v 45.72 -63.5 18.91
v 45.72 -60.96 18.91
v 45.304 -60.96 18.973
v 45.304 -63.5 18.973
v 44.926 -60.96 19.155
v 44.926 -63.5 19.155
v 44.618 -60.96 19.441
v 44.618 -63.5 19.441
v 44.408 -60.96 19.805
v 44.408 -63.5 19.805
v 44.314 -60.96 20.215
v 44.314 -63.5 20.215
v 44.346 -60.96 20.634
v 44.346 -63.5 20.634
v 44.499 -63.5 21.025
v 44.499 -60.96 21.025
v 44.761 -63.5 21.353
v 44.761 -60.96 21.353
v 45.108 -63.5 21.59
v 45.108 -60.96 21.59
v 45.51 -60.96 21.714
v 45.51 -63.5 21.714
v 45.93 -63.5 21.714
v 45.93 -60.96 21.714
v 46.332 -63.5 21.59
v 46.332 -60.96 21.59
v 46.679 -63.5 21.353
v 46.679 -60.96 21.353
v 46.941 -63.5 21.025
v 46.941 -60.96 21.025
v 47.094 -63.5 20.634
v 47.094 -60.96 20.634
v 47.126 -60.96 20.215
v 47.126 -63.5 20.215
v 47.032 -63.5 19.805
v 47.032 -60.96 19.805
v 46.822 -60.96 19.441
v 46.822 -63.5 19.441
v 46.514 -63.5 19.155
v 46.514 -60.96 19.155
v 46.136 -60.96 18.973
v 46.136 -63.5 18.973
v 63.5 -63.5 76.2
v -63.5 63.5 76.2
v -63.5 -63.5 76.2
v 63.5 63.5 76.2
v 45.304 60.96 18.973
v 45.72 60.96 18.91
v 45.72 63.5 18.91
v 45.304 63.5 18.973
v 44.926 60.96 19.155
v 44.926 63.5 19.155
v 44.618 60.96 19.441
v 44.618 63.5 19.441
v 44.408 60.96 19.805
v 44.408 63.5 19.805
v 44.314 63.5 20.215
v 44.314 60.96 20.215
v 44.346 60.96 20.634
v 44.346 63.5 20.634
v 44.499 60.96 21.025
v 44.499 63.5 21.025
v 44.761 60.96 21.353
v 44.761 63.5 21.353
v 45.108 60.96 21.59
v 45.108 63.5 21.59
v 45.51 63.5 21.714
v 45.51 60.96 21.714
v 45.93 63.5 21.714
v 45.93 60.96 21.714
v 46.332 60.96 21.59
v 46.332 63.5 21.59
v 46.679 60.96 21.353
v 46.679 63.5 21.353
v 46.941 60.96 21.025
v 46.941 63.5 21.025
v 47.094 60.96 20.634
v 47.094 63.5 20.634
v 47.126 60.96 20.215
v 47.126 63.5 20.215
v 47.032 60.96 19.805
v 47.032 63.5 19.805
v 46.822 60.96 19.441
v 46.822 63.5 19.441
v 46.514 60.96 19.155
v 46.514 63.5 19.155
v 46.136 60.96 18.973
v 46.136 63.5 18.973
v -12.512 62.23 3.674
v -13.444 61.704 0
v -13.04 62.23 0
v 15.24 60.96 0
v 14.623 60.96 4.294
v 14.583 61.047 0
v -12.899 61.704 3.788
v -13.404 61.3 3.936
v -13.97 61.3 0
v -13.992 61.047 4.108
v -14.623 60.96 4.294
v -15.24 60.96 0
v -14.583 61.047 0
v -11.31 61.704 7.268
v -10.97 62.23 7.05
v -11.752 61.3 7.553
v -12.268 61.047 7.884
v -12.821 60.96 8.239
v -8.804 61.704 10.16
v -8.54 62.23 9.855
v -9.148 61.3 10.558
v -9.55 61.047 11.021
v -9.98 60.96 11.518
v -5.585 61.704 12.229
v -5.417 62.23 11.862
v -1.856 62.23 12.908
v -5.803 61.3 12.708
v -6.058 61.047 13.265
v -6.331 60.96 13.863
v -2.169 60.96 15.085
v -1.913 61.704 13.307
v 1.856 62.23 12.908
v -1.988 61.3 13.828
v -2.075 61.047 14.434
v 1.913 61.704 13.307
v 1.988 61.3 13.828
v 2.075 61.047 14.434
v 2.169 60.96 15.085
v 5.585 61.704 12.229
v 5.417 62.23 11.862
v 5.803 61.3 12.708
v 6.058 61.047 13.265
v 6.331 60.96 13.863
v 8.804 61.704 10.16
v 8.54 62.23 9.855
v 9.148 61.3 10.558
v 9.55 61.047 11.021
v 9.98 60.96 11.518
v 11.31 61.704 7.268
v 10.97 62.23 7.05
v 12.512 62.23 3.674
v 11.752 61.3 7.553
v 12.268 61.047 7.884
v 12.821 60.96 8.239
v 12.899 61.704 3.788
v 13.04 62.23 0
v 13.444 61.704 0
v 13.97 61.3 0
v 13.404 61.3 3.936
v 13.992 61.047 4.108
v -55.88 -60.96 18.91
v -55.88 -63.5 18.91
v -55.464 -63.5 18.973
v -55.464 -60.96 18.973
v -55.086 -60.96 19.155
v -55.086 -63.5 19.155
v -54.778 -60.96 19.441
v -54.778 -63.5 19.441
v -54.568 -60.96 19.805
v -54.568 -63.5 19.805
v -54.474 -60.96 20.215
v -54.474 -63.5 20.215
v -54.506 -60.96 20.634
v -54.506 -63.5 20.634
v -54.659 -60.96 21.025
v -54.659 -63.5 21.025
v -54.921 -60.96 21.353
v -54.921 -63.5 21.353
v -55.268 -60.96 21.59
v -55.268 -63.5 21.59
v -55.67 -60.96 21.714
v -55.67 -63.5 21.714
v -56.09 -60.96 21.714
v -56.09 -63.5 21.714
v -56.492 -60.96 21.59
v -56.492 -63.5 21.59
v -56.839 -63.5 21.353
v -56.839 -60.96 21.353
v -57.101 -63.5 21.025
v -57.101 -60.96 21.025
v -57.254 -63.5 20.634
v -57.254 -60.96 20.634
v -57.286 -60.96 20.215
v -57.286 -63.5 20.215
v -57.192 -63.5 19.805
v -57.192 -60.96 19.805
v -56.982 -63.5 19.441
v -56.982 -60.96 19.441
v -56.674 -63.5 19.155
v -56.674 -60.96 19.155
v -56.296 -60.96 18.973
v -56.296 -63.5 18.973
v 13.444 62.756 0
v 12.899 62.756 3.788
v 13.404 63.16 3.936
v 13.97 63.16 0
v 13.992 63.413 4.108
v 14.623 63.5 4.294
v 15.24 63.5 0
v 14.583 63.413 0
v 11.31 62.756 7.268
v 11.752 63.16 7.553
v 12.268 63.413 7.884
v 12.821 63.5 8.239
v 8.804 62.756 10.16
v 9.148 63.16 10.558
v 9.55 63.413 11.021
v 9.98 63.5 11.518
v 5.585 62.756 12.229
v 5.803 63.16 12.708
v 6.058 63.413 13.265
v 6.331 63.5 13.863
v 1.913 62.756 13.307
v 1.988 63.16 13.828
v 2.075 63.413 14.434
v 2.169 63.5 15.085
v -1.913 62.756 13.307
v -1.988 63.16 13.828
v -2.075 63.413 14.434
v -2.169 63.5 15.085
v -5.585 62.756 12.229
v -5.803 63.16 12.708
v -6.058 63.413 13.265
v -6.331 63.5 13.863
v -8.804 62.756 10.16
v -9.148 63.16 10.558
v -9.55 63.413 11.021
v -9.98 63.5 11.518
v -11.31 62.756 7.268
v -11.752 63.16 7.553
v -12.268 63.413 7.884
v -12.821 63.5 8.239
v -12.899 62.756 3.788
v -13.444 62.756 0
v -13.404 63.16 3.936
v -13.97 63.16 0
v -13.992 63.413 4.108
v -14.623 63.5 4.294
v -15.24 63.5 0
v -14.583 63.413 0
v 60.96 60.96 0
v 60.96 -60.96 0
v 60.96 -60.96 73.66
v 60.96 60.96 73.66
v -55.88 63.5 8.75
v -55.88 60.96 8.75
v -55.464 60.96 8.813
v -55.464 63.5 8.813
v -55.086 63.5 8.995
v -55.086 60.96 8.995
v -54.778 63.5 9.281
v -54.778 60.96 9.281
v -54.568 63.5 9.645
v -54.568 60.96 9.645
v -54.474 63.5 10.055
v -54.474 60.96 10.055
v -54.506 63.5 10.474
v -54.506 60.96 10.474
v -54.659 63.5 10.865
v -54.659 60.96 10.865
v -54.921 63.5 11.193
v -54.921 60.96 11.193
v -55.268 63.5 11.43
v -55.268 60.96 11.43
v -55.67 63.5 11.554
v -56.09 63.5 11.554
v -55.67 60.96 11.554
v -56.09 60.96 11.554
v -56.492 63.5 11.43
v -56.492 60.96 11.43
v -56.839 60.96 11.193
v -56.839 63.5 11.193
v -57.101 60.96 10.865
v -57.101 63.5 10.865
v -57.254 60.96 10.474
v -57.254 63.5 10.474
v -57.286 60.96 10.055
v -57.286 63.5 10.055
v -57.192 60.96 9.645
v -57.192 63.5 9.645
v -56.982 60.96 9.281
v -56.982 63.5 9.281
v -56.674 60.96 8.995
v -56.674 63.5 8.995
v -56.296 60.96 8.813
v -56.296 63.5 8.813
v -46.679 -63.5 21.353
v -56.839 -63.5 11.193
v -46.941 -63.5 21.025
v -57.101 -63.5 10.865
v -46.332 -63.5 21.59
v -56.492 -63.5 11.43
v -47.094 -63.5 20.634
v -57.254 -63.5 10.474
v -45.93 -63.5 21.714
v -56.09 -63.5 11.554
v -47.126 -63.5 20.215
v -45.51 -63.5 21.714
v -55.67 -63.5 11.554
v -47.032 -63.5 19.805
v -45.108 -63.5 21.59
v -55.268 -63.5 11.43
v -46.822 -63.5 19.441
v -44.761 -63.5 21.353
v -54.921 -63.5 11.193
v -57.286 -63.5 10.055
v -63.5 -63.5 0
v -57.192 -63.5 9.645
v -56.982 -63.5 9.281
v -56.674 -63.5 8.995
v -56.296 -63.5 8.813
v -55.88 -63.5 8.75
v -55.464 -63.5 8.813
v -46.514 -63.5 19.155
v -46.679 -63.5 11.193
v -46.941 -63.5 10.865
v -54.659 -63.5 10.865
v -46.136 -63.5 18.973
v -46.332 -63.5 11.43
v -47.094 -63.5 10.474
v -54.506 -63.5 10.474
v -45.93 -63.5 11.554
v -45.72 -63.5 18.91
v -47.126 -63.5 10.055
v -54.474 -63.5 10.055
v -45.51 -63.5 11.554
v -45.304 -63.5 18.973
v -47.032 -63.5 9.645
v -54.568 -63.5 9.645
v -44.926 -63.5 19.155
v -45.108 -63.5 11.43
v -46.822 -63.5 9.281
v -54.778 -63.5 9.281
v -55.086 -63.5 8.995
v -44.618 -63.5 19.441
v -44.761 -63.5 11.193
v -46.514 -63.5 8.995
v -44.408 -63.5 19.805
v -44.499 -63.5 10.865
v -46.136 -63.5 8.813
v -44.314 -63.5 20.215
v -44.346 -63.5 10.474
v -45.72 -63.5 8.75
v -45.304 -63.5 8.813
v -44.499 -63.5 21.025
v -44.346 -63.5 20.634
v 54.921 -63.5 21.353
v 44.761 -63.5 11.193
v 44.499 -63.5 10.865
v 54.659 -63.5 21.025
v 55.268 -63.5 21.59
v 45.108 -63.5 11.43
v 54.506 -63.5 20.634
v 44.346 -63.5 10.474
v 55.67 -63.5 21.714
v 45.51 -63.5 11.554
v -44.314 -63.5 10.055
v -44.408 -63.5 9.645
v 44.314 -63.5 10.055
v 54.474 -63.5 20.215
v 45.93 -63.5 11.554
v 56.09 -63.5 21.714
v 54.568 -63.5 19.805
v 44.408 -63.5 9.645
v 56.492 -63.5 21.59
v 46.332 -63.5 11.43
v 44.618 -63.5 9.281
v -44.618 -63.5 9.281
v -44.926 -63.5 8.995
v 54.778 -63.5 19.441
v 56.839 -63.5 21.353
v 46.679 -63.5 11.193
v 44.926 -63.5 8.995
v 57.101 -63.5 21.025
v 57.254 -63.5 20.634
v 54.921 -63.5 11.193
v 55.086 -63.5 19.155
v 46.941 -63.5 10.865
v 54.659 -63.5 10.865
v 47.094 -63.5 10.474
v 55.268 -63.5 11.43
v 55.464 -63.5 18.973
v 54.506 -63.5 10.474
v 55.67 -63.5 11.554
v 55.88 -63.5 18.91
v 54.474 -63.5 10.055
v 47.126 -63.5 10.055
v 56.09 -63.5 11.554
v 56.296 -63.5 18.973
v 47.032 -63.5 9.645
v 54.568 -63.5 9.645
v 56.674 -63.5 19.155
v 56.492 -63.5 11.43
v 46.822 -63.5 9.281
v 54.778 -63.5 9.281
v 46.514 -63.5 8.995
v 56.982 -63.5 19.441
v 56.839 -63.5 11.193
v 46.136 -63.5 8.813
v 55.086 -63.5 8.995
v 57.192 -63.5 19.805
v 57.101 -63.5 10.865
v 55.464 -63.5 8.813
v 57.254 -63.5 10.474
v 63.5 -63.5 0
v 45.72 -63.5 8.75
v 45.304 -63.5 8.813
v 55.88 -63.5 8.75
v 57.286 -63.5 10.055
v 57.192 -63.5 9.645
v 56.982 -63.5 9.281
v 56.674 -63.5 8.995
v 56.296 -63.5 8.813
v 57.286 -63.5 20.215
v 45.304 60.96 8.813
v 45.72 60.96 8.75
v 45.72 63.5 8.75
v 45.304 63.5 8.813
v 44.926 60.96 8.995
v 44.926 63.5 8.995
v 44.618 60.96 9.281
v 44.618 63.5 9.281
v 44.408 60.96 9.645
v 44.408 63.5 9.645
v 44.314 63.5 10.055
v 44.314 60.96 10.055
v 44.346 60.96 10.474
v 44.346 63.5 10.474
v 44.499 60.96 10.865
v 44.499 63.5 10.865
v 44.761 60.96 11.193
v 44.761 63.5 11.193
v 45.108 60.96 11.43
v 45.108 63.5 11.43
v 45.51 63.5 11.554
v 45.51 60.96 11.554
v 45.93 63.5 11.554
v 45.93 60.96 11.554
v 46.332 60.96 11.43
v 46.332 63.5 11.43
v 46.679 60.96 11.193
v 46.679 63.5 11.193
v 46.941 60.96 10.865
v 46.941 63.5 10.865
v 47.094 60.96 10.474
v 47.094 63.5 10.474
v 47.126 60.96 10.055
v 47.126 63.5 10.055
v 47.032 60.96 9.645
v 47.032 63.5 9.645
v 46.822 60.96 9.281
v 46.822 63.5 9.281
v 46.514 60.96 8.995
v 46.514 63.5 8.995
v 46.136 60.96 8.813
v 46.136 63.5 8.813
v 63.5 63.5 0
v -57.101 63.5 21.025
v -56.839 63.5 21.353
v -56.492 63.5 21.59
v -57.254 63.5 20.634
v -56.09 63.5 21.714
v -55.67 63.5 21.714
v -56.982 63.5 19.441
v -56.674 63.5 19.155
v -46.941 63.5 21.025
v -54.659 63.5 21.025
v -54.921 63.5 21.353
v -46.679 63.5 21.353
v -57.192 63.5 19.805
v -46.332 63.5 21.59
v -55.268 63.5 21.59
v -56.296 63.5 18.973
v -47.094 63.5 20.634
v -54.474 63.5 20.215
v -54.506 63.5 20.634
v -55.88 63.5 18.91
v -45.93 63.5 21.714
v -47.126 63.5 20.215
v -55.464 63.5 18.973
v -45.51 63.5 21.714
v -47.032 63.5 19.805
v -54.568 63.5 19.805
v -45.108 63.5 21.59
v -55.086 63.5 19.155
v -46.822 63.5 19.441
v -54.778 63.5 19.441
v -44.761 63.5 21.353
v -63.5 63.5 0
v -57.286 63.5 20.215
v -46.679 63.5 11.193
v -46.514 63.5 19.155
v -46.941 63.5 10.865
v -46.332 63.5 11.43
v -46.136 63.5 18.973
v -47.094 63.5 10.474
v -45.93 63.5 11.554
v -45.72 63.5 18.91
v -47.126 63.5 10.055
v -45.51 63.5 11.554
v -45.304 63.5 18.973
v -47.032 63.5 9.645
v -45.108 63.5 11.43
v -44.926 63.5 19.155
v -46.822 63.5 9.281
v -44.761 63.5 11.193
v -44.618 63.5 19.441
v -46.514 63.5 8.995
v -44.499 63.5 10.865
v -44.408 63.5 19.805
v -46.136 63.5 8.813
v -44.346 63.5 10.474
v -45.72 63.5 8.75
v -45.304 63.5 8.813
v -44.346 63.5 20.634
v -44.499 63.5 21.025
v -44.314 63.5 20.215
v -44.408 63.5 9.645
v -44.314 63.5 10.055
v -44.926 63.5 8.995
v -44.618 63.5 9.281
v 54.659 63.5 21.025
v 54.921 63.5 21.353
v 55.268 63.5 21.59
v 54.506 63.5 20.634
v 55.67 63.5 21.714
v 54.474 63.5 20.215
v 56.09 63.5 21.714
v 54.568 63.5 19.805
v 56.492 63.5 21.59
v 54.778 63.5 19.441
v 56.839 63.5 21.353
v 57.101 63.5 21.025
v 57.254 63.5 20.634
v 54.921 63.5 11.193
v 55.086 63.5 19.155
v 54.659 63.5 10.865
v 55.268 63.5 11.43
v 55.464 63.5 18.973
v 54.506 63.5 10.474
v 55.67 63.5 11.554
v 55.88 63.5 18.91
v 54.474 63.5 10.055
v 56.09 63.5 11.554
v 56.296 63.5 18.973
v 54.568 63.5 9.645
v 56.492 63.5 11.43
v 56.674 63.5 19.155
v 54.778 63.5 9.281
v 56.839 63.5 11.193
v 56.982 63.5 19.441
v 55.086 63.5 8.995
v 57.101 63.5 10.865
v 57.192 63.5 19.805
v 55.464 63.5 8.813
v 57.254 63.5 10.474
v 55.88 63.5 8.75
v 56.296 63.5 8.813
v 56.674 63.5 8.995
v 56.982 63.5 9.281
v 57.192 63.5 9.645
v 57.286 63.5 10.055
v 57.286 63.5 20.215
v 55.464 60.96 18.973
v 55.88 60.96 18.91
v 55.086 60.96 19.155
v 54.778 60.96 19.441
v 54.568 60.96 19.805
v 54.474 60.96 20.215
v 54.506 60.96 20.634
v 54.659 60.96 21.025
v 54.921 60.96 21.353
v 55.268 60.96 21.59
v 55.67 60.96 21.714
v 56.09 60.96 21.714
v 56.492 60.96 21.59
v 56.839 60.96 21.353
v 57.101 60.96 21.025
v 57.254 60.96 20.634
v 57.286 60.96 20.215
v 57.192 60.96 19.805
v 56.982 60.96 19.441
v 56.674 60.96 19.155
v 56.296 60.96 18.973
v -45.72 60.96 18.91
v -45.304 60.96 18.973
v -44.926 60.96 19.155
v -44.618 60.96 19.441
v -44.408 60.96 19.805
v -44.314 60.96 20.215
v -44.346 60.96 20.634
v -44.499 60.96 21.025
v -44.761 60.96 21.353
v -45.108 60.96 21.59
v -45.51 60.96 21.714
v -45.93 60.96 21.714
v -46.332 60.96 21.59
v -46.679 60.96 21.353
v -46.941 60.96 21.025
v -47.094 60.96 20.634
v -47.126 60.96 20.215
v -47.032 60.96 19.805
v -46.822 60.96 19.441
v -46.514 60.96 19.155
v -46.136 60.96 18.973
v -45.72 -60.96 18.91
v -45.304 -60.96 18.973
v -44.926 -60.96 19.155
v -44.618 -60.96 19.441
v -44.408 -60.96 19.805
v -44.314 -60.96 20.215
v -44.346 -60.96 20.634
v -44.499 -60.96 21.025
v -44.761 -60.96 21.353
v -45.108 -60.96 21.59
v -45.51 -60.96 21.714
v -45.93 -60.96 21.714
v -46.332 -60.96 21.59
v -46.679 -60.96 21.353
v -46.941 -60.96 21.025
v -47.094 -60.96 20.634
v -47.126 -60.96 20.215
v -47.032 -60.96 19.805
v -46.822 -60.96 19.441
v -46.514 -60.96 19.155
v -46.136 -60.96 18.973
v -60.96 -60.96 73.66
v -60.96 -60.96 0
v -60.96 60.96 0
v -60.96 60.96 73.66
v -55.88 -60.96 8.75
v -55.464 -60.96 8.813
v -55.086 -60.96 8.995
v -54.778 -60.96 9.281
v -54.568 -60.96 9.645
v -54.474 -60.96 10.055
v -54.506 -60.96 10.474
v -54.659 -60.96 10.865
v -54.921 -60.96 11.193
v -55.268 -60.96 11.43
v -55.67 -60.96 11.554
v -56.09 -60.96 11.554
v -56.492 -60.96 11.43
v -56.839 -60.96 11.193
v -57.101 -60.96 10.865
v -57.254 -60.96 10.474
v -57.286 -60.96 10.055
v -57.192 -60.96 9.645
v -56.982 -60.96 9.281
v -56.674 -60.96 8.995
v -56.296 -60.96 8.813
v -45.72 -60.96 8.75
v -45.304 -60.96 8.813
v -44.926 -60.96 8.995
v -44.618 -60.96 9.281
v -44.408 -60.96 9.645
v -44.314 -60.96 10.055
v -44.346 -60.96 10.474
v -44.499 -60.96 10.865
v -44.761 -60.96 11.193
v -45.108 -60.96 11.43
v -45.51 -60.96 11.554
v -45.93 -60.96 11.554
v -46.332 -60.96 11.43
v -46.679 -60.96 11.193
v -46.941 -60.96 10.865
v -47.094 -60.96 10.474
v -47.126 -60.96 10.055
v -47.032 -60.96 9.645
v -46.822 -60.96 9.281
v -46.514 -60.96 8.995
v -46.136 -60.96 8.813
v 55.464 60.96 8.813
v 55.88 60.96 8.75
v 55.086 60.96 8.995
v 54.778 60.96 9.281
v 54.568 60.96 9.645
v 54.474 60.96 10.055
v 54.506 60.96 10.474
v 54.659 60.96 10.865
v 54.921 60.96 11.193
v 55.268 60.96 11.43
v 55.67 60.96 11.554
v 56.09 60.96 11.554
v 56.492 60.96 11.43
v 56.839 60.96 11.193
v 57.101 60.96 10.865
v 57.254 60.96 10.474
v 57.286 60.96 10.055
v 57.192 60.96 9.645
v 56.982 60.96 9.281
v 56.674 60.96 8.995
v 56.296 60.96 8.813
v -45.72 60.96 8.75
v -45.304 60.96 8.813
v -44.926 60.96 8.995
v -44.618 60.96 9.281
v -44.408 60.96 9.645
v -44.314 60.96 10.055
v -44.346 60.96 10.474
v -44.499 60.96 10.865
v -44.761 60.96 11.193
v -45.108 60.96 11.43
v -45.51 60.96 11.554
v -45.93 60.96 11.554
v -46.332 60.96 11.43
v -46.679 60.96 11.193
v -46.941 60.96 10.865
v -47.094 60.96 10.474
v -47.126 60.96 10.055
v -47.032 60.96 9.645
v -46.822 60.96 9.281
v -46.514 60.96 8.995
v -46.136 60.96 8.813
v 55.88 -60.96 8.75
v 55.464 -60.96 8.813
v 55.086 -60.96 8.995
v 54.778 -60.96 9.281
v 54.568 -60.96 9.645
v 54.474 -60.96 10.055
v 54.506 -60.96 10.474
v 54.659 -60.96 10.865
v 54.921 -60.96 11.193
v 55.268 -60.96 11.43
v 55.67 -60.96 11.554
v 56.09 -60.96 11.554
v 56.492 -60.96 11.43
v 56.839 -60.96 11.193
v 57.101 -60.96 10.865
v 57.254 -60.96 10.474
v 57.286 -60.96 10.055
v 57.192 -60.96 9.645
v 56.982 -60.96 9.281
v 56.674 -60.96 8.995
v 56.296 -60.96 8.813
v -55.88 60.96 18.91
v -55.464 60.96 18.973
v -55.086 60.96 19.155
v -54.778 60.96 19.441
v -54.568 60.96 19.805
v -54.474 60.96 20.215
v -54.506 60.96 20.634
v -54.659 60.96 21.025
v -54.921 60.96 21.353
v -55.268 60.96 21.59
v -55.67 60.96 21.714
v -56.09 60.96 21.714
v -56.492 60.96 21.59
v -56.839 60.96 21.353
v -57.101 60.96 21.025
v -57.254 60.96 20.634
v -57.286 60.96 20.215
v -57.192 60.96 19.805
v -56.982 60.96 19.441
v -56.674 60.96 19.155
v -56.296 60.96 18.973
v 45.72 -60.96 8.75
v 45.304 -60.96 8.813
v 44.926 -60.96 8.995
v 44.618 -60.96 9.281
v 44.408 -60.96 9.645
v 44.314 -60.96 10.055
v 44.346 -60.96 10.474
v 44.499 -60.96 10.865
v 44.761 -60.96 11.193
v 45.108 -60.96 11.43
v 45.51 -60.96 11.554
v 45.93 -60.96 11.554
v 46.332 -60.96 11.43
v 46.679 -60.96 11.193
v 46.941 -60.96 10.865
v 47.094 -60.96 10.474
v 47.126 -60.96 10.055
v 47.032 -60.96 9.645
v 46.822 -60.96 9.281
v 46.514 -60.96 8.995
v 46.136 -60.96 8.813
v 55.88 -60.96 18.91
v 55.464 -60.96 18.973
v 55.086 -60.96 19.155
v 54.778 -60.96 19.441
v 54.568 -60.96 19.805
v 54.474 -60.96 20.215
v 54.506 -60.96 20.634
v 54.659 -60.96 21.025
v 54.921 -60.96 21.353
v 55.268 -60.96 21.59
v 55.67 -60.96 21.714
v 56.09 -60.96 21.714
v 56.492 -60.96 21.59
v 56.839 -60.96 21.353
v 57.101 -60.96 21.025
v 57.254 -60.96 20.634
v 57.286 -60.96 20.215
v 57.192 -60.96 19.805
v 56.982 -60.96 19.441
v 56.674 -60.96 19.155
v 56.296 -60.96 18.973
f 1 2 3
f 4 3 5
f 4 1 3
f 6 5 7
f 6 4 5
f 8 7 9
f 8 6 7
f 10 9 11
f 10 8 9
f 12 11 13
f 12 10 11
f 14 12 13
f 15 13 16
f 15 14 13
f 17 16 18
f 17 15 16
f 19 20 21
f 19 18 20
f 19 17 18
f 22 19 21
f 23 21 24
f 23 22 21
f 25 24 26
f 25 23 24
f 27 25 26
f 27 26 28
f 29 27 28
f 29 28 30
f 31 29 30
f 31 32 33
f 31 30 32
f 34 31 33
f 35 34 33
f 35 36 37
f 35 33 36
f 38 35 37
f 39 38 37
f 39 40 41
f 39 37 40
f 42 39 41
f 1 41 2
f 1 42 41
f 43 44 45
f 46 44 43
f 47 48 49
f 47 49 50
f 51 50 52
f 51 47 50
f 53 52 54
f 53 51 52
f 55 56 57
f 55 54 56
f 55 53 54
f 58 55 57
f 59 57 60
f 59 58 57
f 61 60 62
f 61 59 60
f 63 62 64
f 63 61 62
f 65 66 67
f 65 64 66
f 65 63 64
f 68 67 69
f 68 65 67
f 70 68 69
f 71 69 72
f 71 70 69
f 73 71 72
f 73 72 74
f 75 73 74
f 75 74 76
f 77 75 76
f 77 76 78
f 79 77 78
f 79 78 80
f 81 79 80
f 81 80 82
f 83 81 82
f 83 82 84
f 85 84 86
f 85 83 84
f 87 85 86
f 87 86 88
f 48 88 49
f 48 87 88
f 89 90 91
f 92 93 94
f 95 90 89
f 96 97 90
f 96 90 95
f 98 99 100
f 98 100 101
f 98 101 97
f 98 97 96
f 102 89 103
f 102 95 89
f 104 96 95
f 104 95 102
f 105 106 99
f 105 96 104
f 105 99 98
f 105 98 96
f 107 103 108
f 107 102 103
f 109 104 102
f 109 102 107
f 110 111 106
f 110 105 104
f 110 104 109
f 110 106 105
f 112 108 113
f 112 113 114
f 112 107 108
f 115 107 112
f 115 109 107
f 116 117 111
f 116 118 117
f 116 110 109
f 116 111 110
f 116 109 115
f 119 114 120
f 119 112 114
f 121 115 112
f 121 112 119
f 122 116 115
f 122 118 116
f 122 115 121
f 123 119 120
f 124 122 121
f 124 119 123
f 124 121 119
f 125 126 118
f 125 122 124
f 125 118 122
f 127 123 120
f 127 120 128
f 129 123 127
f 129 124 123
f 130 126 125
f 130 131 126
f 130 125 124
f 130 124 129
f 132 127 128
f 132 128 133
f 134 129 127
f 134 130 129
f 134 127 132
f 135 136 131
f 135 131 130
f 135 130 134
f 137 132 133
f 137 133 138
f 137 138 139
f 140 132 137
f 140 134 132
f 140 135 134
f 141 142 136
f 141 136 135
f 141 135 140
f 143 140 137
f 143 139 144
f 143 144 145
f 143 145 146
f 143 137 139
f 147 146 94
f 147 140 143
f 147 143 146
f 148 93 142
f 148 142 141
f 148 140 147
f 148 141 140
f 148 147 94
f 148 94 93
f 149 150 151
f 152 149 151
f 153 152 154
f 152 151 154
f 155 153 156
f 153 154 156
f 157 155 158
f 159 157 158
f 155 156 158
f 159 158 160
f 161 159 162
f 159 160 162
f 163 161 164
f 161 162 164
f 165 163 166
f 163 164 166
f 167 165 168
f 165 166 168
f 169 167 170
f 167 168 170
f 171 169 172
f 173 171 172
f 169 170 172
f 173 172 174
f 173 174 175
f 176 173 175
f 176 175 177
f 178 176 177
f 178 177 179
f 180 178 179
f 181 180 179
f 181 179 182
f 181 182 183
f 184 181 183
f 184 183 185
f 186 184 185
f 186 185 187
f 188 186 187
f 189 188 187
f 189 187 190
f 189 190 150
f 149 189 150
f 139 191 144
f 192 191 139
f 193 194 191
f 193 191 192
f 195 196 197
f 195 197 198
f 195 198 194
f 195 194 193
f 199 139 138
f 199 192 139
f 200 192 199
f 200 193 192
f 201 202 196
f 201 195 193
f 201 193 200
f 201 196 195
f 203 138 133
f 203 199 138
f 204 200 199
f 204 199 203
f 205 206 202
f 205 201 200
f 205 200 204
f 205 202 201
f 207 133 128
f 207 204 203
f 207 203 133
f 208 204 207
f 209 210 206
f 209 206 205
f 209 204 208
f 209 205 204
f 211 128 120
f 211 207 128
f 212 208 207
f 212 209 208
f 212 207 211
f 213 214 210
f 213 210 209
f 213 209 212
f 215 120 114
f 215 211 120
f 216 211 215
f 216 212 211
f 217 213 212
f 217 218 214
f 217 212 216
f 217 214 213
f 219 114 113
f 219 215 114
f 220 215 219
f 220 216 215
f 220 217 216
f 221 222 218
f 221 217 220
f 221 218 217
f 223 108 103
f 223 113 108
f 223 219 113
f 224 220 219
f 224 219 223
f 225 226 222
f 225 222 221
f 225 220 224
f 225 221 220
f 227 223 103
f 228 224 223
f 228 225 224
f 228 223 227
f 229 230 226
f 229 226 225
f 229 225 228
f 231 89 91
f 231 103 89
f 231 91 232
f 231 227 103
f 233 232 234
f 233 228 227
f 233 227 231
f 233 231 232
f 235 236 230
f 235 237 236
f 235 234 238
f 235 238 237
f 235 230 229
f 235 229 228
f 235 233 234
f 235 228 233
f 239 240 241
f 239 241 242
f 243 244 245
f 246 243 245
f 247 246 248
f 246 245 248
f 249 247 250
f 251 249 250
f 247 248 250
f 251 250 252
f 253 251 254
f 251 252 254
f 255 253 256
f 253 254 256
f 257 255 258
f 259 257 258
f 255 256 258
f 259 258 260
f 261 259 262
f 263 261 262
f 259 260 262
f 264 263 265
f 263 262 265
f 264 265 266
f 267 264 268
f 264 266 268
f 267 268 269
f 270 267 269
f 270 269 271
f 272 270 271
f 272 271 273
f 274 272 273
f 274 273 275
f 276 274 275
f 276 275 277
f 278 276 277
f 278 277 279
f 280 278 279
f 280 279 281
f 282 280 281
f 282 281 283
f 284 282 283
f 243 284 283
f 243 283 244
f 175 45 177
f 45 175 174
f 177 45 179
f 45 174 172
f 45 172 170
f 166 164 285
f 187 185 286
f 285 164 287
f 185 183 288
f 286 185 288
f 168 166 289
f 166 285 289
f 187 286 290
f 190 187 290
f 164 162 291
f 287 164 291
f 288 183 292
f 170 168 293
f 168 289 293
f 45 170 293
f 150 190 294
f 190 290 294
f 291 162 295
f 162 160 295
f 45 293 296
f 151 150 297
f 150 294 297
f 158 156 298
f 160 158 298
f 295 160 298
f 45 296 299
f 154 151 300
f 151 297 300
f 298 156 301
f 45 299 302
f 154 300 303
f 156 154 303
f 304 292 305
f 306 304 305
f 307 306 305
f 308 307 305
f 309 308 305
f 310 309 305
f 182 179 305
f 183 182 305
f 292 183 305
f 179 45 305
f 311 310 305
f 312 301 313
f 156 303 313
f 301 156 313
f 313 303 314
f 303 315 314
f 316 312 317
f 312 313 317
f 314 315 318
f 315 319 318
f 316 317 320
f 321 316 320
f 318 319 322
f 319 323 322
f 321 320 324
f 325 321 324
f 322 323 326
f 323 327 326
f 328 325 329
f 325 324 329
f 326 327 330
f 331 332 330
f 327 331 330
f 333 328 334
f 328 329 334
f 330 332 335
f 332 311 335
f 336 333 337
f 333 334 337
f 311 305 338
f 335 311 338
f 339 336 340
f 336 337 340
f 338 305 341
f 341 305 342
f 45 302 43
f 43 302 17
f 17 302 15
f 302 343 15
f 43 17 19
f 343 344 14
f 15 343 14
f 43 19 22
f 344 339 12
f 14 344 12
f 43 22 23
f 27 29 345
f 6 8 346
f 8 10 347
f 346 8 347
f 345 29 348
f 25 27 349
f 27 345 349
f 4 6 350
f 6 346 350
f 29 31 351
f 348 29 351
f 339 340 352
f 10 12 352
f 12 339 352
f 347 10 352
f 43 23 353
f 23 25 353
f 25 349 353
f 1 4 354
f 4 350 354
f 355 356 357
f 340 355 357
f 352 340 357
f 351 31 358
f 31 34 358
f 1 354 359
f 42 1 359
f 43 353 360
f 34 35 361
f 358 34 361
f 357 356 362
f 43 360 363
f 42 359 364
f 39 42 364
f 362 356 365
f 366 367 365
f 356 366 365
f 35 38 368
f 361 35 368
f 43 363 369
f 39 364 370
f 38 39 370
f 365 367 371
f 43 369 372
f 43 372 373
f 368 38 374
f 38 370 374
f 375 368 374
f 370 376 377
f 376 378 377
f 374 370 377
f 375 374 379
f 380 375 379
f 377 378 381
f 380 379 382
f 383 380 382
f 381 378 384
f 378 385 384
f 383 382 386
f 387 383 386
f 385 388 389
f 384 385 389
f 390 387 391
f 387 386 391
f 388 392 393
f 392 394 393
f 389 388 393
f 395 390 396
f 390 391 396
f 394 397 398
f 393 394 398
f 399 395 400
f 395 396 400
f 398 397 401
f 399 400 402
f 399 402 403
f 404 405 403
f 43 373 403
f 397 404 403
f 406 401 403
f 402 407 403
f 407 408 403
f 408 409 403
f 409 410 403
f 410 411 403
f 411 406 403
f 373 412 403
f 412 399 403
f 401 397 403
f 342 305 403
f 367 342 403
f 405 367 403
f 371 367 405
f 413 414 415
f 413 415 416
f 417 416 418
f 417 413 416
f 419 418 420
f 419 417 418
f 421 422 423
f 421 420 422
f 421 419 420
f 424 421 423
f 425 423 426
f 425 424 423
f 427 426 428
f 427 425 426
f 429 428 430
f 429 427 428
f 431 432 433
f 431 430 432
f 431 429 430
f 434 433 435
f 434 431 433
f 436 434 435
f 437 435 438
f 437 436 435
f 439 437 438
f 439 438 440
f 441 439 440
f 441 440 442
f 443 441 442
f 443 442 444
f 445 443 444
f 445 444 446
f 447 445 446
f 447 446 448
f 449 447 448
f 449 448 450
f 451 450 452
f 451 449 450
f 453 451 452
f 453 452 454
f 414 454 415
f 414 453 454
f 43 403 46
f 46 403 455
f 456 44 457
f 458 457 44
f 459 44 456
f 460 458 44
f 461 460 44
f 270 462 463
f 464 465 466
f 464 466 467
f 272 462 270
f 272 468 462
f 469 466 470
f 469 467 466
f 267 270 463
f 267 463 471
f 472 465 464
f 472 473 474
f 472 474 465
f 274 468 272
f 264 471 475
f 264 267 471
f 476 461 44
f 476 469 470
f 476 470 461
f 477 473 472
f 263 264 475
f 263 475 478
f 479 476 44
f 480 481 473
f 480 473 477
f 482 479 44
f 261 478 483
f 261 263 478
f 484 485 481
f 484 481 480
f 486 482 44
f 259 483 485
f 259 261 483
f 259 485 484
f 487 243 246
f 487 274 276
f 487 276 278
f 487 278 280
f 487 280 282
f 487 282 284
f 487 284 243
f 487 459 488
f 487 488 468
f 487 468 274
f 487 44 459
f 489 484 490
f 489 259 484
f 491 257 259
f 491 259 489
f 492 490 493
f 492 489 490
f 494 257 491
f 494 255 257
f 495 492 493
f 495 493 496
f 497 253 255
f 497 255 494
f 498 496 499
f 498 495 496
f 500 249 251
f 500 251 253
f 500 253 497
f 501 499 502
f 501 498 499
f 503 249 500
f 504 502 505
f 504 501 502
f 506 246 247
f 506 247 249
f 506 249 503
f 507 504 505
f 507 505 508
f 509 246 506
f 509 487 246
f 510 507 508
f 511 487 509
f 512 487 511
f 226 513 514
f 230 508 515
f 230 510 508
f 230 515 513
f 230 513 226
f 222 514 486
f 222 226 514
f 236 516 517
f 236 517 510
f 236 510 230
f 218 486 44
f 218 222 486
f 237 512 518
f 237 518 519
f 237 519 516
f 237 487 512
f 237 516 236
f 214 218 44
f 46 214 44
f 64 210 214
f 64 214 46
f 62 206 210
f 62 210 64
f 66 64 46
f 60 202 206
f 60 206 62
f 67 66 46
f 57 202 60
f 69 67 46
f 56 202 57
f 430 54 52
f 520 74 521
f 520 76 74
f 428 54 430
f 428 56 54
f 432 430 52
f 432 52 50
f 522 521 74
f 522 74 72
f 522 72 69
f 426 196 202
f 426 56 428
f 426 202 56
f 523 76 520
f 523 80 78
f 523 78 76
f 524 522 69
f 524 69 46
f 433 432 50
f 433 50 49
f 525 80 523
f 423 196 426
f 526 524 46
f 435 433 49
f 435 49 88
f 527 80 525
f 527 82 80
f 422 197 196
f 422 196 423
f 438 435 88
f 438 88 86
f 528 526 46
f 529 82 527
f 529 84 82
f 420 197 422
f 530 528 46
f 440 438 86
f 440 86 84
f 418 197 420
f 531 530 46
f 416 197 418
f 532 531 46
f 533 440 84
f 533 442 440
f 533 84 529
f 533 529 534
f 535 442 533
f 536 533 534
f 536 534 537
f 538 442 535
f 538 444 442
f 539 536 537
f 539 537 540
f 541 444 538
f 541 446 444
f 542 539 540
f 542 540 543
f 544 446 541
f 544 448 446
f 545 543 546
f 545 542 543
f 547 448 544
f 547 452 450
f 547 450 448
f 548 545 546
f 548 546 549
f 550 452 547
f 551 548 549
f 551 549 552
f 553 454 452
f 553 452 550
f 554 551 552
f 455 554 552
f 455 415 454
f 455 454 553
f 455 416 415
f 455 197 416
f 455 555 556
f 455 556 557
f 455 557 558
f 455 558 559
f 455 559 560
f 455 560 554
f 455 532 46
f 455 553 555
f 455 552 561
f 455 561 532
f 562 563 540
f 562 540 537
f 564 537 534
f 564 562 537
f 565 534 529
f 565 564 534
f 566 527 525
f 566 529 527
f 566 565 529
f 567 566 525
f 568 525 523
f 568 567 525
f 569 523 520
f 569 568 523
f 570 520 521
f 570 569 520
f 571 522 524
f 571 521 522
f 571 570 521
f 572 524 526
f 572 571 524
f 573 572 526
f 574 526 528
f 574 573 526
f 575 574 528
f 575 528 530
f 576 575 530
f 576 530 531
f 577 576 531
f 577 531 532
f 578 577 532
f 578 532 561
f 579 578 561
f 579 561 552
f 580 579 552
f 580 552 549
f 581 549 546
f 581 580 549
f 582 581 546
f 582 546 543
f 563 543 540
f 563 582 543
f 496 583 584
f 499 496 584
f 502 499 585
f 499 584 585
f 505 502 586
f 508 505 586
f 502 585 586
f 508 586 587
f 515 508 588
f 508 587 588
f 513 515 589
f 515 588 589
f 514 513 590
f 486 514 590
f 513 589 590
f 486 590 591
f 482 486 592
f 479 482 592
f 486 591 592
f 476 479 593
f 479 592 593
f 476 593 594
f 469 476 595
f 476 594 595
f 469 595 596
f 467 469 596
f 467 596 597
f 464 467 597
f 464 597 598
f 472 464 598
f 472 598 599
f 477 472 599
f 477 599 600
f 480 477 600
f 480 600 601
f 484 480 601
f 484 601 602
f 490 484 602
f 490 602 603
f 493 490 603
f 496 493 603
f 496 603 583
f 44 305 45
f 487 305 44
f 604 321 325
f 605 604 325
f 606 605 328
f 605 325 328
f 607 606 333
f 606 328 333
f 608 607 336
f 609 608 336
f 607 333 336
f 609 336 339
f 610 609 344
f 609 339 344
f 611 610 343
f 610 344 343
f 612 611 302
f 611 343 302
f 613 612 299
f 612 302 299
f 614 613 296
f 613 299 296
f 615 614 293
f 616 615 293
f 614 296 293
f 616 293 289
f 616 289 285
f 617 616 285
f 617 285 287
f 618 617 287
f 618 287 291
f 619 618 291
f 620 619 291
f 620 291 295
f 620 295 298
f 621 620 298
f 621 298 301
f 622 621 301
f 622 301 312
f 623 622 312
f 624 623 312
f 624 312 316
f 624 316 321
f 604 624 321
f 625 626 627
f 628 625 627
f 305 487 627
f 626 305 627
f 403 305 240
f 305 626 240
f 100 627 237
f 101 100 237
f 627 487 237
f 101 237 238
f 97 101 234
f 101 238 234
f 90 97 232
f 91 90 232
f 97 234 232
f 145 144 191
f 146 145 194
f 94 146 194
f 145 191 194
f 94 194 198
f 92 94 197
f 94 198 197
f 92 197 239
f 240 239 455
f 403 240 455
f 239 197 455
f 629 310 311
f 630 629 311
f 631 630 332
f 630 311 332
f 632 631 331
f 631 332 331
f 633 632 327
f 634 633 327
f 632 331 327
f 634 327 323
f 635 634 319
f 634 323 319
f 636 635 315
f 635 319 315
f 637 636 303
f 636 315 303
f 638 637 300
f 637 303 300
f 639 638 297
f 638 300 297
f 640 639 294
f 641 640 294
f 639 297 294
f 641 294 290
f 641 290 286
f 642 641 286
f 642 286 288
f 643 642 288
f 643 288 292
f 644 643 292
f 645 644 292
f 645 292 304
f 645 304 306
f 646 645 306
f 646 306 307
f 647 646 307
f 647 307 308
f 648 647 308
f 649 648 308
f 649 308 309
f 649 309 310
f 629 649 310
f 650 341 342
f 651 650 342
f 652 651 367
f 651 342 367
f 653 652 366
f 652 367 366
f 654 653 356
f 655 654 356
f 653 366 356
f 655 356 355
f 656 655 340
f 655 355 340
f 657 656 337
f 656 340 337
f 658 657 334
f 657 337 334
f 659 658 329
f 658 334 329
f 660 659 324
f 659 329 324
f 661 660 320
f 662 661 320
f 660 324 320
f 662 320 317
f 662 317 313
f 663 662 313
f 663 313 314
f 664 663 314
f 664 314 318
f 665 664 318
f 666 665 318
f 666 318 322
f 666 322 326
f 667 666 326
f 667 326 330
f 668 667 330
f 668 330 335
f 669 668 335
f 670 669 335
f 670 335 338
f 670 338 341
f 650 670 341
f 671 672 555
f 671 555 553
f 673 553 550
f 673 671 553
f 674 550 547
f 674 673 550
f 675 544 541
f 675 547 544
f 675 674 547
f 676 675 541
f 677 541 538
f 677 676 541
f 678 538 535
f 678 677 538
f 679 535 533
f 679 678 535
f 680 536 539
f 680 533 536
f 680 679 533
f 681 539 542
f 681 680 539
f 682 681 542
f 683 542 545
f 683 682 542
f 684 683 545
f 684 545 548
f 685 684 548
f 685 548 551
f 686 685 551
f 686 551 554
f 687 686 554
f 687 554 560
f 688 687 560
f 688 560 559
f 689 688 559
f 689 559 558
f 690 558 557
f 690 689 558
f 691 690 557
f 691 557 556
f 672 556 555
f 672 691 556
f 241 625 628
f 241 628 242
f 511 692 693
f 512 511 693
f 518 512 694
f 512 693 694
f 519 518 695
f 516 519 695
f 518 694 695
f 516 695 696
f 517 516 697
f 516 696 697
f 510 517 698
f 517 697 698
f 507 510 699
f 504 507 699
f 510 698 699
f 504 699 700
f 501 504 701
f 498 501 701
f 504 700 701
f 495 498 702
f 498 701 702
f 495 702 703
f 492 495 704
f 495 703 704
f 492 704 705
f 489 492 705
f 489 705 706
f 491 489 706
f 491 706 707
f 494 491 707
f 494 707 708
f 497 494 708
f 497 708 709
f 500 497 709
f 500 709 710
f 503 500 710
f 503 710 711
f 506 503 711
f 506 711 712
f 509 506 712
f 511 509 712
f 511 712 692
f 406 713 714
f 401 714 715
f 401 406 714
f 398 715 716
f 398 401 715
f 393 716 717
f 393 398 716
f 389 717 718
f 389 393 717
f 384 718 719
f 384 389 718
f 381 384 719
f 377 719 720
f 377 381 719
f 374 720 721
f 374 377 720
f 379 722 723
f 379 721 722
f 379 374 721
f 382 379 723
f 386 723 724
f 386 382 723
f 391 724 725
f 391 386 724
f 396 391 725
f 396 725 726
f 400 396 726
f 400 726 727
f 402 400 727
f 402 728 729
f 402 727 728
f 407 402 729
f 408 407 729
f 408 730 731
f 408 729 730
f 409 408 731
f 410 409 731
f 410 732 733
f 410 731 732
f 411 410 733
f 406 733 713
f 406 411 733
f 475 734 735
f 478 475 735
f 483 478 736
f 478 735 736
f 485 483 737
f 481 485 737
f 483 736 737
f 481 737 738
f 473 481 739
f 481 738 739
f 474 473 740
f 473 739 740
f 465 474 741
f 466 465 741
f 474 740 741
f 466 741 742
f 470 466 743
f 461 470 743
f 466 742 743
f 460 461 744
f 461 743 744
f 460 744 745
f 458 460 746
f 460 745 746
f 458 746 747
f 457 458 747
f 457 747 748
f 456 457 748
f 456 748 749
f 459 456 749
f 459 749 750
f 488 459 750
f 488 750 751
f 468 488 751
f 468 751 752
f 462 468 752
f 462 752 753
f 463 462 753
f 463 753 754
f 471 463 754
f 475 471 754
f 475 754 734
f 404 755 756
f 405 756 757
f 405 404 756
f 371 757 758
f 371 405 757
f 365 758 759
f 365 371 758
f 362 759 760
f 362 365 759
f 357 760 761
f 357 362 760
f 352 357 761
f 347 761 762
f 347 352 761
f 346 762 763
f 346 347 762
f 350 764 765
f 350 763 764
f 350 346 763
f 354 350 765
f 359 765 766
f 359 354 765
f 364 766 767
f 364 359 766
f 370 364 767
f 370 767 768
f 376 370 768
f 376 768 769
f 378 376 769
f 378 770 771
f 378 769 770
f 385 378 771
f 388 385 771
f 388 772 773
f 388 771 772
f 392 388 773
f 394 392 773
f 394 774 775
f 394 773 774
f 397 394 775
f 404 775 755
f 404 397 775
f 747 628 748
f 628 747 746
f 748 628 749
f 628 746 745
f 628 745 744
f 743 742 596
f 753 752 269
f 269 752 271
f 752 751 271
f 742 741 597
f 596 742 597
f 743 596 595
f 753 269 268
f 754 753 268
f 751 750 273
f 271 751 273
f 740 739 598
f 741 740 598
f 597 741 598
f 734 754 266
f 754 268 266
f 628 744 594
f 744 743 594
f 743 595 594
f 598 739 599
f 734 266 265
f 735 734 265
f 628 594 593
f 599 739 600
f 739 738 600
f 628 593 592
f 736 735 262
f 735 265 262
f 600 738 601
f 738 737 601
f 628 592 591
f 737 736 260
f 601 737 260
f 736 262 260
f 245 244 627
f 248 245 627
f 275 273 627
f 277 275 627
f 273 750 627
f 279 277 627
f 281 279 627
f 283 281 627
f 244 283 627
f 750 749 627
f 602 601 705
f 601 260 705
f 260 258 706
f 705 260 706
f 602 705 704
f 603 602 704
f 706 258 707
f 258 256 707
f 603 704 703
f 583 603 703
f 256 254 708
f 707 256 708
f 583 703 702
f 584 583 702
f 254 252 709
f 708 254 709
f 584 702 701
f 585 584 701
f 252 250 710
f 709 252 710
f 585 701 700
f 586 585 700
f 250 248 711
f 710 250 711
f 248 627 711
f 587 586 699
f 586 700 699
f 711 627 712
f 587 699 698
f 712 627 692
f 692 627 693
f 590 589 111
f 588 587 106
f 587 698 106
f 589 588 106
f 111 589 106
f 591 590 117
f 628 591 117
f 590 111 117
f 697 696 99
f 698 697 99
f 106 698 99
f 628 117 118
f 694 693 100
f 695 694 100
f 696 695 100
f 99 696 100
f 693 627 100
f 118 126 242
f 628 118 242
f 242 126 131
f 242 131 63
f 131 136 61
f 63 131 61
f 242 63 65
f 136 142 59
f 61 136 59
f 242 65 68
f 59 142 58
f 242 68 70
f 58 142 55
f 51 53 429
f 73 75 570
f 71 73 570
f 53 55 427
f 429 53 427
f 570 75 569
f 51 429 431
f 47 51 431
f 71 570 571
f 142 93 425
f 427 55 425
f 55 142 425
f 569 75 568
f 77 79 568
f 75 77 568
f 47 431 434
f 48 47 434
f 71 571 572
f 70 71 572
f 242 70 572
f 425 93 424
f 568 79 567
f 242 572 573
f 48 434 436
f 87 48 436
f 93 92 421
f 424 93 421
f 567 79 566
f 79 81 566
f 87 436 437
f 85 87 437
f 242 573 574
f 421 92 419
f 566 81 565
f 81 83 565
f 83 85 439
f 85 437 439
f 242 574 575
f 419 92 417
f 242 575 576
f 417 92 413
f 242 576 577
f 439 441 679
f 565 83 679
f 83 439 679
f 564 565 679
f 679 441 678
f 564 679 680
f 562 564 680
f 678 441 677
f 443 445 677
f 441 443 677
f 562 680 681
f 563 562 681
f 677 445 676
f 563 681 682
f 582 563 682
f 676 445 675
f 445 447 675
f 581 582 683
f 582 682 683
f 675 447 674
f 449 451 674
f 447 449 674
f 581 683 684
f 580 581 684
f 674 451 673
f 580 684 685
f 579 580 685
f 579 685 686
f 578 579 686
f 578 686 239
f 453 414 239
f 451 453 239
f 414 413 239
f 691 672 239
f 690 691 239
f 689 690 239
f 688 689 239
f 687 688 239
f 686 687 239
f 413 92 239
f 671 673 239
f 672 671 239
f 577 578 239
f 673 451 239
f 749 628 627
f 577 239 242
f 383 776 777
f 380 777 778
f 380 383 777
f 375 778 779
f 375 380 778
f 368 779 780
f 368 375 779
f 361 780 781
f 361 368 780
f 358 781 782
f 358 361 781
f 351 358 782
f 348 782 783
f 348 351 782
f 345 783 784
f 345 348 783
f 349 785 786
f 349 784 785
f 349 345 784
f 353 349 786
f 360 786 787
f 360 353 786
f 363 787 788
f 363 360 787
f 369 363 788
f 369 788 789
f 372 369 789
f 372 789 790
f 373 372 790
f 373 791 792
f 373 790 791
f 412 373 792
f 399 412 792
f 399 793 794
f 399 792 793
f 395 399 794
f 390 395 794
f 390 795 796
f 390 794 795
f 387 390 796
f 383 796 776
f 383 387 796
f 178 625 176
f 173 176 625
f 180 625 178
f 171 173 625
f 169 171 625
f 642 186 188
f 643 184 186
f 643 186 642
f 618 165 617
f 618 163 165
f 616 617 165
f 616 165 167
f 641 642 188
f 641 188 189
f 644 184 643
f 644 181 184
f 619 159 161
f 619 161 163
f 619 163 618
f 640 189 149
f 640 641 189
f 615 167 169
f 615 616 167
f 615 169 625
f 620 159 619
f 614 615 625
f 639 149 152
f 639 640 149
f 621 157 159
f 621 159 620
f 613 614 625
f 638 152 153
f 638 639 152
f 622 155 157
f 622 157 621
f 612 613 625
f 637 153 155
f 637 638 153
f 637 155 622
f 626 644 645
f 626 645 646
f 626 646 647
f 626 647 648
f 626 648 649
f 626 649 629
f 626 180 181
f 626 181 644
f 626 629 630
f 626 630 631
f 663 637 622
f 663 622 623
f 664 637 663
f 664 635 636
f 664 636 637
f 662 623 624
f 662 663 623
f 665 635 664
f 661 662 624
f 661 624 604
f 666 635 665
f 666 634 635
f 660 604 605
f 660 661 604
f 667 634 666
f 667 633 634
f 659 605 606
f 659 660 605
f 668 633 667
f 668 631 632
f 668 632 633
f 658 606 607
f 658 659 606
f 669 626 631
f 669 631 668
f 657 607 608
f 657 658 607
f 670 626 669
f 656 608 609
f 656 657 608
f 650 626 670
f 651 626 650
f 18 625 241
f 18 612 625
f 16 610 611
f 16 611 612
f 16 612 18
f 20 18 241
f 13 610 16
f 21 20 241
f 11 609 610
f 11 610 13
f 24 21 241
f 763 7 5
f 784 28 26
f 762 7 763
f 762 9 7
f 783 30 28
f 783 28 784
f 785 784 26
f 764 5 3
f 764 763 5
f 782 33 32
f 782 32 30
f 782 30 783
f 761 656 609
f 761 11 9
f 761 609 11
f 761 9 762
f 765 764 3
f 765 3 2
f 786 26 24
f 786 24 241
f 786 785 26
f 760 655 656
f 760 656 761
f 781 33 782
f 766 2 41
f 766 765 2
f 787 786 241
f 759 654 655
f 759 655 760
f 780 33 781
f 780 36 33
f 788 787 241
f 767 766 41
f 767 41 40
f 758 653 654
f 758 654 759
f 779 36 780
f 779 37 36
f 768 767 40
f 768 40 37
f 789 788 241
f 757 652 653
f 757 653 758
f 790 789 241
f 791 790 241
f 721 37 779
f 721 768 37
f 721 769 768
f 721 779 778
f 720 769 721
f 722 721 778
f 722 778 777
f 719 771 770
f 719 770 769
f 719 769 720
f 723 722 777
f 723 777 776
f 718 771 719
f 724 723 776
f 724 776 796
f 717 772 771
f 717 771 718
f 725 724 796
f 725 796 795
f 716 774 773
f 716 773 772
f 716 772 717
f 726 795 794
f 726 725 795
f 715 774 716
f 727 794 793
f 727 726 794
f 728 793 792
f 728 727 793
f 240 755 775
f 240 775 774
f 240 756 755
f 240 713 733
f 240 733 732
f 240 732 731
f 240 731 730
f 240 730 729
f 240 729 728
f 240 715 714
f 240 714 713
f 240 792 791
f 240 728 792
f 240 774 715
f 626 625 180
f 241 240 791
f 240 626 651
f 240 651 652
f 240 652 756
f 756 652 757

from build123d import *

# Parameters (mm, degrees)
SKETCH1_W               = 127
SKETCH1_H               = 127
BOSS_EXTRUDE1_DEPTH     = 76.2
SHELL2_T                = -2.54
CUT_EXTRUDE1_DEPTH      = 162.144934764
CUT_EXTRUDE1_DEPTH_BACK = 2.54
FILLET3_R               = 2.54
SKETCH3_R               = 1.4097
CUT_EXTRUDE2_DEPTH      = 162.144934764


with BuildPart() as part:
    # Sketch1 → Boss-Extrude1 (new body)
    with BuildSketch(Plane.XY):
        Rectangle(SKETCH1_W, SKETCH1_H)
    extrude(amount=BOSS_EXTRUDE1_DEPTH)

    # Shell2
    shell2_openings = [part.faces().sort_by_distance(p)[0] for p in [
        (0, 0, 0),
    ]]
    offset(amount=SHELL2_T, openings=shell2_openings, kind=Kind.INTERSECTION)

    # Sketch2 → Cut-Extrude1 (cut, two sides: drawn at the far end of the back side and taken through both)
    with BuildSketch(Plane(origin=(0, 63.5, 0), x_dir=(1, 0, 0), z_dir=(0, 1, 0)).offset(-CUT_EXTRUDE1_DEPTH_BACK)):
        with BuildLine():
            Line((-12.7, 225.526146906), (-12.7, 0))
            ThreePointArc((-12.7, 0), (0, -12.7), (12.7, 0))
            Line((12.7, 0), (12.7, 225.526146906))
            Line((12.7, 225.526146906), (12.7, 676.578440717))
            Line((12.7, 676.578440717), (-12.7, 676.578440717))
            Line((-12.7, 676.578440717), (-12.7, 225.526146906))
        make_face()
    extrude(amount=CUT_EXTRUDE1_DEPTH + CUT_EXTRUDE1_DEPTH_BACK, mode=Mode.SUBTRACT)

    # Fillet3
    # the kernel refuses this fillet: 2.54 mm, written as the material it takes off along each edge
    with BuildSketch(Plane(origin=(0, 60.96, 0), x_dir=(-0.8771967747646356, 0, -0.4801310428857115), z_dir=(0.4801310428857115, 0, -0.8771967747646356))) as fillet3_piece_1:
        with BuildLine():
            CenterArc((12.7 + FILLET3_R, FILLET3_R), FILLET3_R, 180, 90)
            Line((12.7 + FILLET3_R, 0), (12.7, 0))
            Line((12.7, 0), (12.7, FILLET3_R))
        make_face()
    revolve(axis=Axis((0, 60.96, 0), (0, 1, 0)), revolution_arc=237.38792196, mode=Mode.SUBTRACT)
    with BuildSketch(Plane(origin=(0, 63.5, 0), x_dir=(0.8771967747646356, 0, -0.4801310428857116), z_dir=(-0.4801310428857116, 0, -0.8771967747646356))) as fillet3_piece_2:
        with BuildLine():
            CenterArc((12.7 + FILLET3_R, FILLET3_R), FILLET3_R, 180, 90)
            Line((12.7, FILLET3_R), (12.7, 0))
            Line((12.7, 0), (12.7 + FILLET3_R, 0))
        make_face()
    revolve(axis=Axis((0, 63.5, 0), (0, -1, 0)), revolution_arc=237.38792196, mode=Mode.SUBTRACT)

    # Sketch3 → Cut-Extrude2 (cut, through all)
    with BuildSketch(Plane.XZ.offset(63.5)):
        with Locations(Location((-55.88, 20.32, 0), (0, 0, 270))):
            Circle(SKETCH3_R)
        with Locations(Location((-45.72, 20.32, 0), (0, 0, 270))):
            Circle(SKETCH3_R)
        with Locations(Location((-55.88, 10.16, 0), (0, 0, 270))):
            Circle(SKETCH3_R)
        with Locations(Location((-45.72, 10.16, 0), (0, 0, 270))):
            Circle(SKETCH3_R)
    cut_extrude2 = extrude(amount=-CUT_EXTRUDE2_DEPTH, mode=Mode.SUBTRACT)

    # Mirror1: Cut-Extrude2 across plane
    add(cut_extrude2.mirror(Plane(origin=(0, 0, 0), x_dir=(0, 0, 1), z_dir=(1, 0, 0))), mode=Mode.SUBTRACT)


solid = part.part
